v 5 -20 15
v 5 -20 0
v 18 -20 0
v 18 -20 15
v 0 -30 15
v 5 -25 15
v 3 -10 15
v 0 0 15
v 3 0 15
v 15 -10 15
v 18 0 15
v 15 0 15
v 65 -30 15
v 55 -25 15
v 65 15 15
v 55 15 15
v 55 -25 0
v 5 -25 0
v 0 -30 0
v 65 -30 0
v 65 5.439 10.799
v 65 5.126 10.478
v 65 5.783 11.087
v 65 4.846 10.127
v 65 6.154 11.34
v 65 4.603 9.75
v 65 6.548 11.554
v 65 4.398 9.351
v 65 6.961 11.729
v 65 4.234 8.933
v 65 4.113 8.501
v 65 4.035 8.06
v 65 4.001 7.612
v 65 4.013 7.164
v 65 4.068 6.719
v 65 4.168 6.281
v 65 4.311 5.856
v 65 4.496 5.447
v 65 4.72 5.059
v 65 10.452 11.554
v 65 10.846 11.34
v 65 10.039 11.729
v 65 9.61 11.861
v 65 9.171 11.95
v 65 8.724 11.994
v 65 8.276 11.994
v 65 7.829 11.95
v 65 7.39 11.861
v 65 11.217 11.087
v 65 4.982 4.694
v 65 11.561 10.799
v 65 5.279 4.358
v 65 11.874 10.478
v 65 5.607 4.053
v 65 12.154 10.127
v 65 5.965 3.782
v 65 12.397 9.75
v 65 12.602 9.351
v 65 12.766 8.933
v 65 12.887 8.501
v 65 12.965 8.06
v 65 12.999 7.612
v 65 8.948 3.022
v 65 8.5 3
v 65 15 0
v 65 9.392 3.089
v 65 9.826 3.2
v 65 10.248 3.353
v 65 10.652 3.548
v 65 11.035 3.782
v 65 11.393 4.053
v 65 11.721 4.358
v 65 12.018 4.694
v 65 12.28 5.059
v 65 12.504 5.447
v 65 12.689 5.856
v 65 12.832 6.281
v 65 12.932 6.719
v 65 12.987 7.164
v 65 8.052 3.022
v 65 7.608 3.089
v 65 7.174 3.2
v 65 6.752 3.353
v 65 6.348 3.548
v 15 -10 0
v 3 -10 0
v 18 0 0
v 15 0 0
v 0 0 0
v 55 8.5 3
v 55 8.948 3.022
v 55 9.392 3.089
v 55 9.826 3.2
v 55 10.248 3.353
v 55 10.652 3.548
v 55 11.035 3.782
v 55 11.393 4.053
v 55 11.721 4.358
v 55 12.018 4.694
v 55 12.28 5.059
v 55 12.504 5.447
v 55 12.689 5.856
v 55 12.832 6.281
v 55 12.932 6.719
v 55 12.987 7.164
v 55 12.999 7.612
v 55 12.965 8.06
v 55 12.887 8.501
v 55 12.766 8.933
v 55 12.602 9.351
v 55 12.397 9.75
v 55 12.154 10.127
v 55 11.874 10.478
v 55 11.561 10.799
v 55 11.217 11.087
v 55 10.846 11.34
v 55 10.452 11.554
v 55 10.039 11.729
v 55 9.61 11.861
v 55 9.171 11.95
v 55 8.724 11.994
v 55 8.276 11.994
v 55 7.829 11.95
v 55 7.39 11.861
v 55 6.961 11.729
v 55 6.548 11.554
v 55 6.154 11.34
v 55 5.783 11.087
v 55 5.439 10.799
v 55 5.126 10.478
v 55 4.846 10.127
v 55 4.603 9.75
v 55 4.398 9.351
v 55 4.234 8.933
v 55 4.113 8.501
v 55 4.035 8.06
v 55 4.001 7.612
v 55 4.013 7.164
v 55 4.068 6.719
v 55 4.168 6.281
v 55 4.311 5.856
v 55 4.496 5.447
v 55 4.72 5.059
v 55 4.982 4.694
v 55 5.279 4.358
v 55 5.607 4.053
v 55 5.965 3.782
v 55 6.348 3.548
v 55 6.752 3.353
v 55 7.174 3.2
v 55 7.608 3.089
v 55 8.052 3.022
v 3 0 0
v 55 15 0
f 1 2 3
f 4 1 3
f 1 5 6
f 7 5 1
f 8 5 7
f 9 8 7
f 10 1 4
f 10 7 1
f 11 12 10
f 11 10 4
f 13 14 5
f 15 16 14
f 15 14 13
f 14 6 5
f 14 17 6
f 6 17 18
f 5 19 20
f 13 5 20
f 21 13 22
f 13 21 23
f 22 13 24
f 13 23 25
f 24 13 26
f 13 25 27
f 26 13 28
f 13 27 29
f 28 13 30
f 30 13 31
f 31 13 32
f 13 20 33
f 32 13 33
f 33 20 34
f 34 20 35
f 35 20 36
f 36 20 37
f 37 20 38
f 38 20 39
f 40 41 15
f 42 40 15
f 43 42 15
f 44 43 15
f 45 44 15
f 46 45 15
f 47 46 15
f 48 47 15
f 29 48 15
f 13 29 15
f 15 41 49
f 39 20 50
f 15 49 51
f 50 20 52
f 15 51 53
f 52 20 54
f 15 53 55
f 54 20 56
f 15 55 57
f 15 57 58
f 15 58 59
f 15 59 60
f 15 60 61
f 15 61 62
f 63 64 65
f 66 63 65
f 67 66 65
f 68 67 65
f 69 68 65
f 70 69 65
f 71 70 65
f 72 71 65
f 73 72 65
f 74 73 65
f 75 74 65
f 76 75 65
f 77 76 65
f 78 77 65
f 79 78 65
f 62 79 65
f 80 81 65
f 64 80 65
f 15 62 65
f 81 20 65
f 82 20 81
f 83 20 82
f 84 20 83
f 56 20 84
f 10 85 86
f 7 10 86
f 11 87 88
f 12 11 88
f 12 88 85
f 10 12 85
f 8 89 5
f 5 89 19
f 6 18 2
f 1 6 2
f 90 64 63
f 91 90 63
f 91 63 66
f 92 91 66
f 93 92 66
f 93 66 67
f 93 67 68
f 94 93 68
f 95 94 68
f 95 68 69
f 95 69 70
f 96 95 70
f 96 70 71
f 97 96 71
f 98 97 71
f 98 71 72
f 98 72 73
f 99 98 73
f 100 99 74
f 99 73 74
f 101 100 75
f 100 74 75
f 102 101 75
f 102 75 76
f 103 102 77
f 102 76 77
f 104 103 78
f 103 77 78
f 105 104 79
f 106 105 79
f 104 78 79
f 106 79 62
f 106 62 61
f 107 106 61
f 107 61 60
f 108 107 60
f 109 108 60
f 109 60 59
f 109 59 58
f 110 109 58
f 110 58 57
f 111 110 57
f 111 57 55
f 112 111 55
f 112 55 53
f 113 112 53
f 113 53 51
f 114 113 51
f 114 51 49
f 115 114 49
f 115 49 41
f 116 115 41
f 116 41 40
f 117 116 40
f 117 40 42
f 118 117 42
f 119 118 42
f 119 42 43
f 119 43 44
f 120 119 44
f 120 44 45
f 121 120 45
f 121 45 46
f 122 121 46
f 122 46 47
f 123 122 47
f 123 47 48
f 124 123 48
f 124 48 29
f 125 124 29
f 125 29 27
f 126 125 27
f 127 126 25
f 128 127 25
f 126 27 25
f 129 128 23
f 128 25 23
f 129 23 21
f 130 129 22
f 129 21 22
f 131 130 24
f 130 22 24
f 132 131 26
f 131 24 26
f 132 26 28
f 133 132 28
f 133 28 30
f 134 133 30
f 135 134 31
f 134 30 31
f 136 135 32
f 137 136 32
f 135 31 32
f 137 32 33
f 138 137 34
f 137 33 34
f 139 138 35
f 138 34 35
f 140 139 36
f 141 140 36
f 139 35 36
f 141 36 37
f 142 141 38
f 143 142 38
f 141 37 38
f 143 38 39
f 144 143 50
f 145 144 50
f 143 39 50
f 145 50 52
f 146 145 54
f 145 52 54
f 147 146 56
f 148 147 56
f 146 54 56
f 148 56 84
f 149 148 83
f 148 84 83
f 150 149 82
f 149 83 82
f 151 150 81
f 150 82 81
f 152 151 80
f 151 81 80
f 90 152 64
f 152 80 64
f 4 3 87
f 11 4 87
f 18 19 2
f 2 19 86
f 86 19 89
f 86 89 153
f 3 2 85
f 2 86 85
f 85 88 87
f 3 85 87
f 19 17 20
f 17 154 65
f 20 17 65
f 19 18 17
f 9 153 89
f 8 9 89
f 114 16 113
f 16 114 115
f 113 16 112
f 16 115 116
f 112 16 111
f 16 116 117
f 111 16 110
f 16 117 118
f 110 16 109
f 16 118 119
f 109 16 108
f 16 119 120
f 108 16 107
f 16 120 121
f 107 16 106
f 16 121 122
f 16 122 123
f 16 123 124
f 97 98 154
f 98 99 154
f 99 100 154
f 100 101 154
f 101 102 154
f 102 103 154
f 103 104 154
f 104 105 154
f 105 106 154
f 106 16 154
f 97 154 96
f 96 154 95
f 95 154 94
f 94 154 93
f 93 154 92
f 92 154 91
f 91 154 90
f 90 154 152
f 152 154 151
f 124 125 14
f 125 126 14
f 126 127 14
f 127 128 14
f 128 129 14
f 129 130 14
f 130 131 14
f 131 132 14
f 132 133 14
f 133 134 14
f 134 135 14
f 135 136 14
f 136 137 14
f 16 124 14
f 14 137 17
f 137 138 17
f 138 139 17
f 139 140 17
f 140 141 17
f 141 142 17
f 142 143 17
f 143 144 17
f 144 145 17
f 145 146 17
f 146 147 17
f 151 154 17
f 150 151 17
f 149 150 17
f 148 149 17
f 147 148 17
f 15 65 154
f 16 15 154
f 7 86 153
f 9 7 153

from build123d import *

# Parameters (mm, degrees)
EXTRUDE_1_DEPTH     = 15
SKETCH_5_R          = 4.5
CUT_EXTRUDE_1_DEPTH = 15


with BuildPart() as part:
    # Эскиз4 → Бобышка-Вытянуть1 (new body)
    with BuildSketch(Plane.XY):
        Polygon((0, 0), (0, -20), (0, -30), (65, -30), (65, 15), (55, 15), (55, -25), (5, -25), (5, -20), (18, -20), (18, 0), (15, 0), (15, -10), (3, -10), (3, 0), align=None)
    extrude(amount=EXTRUDE_1_DEPTH)

    # Эскиз5 → Вырез-Вытянуть1 (cut)
    with BuildSketch(Plane(origin=(65, 0, 0), x_dir=(0, 0, -1), z_dir=(1, 0, 0))):
        with Locations((-7.5, 8.5)):
            Circle(SKETCH_5_R)
    extrude(amount=-CUT_EXTRUDE_1_DEPTH, mode=Mode.SUBTRACT)


solid = part.part
